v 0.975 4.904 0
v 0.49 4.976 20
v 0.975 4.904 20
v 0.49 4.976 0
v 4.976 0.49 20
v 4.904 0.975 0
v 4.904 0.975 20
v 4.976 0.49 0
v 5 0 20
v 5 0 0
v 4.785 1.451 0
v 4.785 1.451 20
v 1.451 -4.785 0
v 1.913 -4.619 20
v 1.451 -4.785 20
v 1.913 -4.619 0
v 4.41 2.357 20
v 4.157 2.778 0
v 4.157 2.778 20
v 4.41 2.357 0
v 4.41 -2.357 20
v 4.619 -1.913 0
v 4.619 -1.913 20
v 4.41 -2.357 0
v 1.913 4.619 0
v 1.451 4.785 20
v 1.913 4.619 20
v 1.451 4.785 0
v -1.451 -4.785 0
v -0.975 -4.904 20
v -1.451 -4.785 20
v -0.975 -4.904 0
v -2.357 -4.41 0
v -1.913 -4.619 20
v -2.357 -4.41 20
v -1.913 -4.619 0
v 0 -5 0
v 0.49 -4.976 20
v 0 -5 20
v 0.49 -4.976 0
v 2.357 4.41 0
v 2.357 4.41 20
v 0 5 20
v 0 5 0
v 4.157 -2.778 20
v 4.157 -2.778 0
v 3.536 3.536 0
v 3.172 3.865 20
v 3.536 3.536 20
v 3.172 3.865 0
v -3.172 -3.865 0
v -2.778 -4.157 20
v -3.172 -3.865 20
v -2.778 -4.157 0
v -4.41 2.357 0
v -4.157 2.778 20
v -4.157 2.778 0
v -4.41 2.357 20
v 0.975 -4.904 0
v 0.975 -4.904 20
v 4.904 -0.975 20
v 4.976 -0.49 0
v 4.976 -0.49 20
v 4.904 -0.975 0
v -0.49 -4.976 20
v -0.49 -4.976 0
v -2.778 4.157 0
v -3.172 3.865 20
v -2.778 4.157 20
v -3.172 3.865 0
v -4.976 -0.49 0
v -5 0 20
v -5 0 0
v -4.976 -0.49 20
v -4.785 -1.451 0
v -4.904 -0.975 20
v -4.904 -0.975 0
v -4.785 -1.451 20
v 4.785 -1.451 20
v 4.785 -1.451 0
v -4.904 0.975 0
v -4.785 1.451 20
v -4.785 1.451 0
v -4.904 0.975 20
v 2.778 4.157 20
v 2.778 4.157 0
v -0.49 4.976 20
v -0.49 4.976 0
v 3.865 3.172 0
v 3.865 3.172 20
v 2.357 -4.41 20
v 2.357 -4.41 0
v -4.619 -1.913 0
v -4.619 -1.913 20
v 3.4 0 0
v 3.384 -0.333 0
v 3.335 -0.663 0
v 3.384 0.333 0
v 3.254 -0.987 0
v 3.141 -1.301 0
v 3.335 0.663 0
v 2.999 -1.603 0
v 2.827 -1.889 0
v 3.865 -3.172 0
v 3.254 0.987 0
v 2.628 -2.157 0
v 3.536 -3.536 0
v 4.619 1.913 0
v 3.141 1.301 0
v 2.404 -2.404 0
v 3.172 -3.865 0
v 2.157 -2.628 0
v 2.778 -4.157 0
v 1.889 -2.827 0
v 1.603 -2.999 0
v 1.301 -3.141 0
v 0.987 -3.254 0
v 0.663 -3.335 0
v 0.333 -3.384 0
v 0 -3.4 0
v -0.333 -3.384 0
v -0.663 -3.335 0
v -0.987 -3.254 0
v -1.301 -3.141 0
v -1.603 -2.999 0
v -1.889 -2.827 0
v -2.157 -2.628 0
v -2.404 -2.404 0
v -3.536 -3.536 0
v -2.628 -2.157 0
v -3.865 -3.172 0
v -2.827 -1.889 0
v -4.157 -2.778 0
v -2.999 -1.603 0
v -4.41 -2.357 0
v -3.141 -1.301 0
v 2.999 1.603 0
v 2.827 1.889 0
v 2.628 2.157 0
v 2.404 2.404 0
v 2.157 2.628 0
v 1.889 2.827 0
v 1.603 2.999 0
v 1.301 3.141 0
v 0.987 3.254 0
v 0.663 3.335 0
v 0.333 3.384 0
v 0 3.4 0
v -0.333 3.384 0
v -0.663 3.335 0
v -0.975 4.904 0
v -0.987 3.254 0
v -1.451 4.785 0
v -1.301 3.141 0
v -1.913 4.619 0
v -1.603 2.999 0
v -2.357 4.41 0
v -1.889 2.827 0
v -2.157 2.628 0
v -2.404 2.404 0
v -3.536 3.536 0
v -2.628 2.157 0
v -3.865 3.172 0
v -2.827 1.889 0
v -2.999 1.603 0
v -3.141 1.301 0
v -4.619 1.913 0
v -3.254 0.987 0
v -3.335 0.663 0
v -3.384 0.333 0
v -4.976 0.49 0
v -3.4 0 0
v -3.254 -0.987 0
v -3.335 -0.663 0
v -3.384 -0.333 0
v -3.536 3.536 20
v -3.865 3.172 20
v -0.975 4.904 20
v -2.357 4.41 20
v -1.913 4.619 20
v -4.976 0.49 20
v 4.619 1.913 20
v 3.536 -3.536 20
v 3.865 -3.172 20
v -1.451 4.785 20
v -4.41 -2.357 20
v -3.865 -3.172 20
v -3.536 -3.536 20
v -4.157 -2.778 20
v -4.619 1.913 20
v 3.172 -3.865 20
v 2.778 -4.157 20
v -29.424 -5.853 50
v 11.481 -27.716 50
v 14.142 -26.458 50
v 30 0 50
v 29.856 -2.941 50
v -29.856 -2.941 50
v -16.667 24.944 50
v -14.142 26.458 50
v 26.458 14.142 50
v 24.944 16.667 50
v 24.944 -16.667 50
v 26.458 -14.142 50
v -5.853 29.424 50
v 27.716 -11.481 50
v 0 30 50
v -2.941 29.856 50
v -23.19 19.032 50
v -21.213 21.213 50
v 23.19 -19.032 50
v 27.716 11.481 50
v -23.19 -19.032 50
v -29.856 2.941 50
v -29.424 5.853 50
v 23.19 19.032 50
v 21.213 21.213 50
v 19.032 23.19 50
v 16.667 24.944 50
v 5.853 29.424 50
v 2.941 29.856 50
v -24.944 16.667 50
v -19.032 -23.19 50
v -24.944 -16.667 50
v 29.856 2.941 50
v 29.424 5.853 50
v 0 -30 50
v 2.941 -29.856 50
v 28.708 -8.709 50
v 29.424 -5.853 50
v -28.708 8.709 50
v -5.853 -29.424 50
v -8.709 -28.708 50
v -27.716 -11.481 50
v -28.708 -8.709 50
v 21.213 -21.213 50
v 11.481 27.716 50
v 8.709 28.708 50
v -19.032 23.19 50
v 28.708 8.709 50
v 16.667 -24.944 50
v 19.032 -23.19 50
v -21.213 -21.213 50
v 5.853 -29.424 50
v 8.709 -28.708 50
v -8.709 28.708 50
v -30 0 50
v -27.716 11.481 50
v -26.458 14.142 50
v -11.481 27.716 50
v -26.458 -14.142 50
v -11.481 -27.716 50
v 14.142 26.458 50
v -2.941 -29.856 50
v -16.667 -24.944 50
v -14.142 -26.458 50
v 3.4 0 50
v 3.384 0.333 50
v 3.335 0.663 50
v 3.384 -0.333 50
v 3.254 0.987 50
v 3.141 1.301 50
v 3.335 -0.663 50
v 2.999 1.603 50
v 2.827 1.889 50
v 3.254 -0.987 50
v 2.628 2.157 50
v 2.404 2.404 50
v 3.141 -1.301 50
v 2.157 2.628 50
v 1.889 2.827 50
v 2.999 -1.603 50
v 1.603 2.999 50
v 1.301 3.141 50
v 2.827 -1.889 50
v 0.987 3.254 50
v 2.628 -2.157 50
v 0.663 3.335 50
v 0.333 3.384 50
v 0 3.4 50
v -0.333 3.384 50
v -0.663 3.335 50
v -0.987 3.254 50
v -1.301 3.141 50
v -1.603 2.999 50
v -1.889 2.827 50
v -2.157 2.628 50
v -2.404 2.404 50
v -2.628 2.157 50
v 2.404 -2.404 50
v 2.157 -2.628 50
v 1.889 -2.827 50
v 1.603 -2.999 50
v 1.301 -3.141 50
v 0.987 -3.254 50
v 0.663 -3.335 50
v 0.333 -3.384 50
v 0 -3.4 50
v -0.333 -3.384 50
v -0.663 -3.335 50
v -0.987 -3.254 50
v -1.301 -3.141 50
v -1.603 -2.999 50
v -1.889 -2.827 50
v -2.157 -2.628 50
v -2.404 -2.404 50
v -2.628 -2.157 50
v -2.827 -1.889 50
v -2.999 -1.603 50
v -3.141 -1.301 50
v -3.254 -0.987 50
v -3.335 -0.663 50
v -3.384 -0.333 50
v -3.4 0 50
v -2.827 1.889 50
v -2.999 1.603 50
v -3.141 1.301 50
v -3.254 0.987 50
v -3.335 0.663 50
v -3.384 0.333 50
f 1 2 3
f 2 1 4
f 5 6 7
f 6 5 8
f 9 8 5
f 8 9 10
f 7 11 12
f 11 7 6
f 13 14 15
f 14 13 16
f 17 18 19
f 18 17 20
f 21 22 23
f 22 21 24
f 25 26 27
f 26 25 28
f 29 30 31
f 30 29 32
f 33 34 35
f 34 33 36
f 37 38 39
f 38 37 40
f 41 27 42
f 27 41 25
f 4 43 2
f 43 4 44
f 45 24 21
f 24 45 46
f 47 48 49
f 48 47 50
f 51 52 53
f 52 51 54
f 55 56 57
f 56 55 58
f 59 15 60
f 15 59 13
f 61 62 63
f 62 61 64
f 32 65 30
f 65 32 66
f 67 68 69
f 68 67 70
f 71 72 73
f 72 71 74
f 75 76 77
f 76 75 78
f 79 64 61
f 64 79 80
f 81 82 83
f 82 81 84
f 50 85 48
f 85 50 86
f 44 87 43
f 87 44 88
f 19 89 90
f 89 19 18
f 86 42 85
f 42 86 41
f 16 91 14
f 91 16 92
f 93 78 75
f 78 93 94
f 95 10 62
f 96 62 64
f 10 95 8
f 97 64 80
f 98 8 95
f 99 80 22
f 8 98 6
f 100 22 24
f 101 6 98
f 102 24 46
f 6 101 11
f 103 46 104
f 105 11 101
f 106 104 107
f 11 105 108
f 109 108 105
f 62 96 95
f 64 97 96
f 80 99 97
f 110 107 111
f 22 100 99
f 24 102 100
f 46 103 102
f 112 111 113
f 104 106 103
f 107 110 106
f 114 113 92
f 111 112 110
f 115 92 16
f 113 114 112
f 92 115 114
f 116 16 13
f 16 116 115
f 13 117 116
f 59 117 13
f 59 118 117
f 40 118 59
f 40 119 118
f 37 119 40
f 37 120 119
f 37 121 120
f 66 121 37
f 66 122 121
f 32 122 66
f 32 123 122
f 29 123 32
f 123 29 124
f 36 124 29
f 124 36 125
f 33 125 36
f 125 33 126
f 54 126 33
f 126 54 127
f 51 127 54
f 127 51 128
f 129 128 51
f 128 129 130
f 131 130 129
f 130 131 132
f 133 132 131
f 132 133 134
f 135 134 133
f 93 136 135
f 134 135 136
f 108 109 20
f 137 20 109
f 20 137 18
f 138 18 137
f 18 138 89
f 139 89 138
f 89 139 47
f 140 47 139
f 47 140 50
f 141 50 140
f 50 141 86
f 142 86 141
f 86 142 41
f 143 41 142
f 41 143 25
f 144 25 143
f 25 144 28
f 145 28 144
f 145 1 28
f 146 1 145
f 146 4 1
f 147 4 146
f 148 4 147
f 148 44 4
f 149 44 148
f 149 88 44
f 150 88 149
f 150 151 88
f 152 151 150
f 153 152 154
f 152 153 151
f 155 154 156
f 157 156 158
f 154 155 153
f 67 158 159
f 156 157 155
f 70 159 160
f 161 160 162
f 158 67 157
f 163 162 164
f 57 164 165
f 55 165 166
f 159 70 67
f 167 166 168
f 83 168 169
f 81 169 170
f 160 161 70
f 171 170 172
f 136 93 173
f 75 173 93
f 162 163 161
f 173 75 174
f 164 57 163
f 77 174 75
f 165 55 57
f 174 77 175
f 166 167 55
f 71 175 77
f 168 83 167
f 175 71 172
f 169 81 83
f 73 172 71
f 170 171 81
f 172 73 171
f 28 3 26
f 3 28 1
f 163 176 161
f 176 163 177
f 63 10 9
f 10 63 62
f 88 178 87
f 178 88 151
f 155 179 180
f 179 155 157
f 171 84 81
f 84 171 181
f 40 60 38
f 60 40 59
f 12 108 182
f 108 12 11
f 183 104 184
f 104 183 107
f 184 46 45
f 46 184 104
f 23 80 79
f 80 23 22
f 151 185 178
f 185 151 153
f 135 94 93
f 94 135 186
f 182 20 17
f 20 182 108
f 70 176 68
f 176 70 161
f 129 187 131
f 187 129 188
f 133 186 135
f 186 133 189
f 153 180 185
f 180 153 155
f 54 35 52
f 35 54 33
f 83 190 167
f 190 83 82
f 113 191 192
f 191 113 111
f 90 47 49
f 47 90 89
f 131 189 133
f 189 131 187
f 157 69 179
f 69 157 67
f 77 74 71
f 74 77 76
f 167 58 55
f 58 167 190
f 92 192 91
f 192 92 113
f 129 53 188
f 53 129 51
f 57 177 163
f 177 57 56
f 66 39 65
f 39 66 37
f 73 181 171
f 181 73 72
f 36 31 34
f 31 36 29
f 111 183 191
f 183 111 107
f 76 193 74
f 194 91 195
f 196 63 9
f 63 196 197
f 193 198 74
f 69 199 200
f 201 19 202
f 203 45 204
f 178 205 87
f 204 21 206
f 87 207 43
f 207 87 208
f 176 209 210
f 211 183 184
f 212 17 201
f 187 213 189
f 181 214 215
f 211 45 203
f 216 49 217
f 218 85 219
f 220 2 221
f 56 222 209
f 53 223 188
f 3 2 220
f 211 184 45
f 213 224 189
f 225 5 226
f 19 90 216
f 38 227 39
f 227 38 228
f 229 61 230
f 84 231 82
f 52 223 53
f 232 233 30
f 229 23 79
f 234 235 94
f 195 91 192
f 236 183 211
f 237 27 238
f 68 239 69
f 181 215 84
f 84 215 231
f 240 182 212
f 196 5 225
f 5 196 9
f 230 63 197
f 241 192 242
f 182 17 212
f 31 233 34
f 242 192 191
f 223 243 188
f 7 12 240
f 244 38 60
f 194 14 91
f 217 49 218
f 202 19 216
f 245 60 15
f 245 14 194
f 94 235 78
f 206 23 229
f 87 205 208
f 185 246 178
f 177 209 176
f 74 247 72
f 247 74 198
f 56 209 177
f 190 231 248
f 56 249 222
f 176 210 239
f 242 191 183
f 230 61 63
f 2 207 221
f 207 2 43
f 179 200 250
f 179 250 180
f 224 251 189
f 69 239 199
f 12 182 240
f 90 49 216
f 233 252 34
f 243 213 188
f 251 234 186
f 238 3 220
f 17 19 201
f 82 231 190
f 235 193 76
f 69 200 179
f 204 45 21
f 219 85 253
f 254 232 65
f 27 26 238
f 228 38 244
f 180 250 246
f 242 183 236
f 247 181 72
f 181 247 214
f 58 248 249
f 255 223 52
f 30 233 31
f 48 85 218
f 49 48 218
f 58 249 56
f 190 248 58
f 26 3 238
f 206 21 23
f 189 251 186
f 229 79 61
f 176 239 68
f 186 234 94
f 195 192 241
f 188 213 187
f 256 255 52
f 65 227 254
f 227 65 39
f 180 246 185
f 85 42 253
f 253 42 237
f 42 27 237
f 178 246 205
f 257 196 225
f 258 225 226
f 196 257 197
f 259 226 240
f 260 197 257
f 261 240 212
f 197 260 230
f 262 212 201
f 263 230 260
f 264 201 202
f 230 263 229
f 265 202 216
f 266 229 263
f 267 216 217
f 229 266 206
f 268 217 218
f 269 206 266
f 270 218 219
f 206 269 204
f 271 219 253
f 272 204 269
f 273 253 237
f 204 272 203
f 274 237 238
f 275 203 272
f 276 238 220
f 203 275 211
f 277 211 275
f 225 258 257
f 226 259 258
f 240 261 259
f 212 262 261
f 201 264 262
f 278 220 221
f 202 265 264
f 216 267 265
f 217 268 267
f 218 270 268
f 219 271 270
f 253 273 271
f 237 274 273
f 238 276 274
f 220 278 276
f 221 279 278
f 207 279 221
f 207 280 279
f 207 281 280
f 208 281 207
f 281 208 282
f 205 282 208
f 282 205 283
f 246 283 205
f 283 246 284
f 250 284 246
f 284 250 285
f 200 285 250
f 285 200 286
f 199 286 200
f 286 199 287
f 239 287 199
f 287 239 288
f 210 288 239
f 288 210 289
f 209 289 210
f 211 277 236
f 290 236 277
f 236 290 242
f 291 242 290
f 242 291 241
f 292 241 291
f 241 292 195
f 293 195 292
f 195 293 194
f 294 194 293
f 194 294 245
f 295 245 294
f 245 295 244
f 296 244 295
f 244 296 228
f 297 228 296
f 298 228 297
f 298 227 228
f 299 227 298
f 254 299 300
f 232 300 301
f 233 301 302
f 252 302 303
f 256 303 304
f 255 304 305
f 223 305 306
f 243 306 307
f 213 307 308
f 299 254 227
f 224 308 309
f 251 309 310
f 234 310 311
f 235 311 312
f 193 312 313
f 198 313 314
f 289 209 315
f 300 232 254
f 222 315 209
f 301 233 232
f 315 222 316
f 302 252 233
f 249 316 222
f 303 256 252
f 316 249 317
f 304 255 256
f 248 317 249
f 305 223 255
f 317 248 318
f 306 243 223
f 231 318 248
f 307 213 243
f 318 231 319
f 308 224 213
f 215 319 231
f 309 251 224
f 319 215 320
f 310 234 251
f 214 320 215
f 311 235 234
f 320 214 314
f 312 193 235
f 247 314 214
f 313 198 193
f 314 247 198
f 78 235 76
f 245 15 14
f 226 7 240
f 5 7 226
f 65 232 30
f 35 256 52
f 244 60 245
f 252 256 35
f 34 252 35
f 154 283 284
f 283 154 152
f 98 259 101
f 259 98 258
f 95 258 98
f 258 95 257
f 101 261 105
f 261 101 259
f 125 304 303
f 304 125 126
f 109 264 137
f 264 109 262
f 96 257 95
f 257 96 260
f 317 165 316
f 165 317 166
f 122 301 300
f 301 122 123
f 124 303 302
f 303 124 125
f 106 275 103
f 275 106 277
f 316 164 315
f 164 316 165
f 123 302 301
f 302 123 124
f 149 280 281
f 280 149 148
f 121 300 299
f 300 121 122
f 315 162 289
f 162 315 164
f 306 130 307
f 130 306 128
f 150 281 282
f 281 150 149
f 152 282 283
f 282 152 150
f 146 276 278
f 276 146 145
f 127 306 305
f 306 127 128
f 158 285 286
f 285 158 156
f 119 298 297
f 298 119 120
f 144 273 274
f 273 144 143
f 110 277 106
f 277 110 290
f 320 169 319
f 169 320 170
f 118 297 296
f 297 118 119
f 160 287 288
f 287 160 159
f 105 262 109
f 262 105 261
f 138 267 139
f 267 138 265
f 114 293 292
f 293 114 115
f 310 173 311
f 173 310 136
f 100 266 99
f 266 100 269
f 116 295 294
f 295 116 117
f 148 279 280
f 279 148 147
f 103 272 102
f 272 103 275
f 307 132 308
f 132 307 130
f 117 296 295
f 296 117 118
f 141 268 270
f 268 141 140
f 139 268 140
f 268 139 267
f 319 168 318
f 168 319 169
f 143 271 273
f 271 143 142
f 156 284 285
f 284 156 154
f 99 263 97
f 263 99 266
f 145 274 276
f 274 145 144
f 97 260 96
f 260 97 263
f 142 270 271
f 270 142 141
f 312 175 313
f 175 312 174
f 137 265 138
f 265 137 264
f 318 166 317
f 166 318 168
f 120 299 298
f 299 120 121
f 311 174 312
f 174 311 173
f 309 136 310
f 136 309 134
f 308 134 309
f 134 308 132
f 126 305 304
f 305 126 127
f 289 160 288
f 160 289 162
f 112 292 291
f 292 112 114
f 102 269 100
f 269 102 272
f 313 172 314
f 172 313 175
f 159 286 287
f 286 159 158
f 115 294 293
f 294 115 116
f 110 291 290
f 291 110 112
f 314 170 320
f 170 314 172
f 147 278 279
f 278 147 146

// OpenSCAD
// Lab funnel - printed upright, wide opening at the top
// Units: mm. Wall thickness 1.6 mm throughout.

$fn = 64;

// ---- Parameters ----
spout_od      = 10;    // outer diameter of spout
spout_id      = spout_od - 2 * 1.6;  // spout bore (6.8 mm)
spout_h       = 20;    // spout height (z = 0 .. 20)

cone_bottom_d = spout_id;  // cone inner diameter at z = 20
cone_top_d    = 60;    // cone rim outer diameter at z = 50
cone_h        = 50 - 20; // cone height (z = 20 .. 50)

eps           = 0.5;   // overlap for clean cuts

// ---- Model ----
difference() {
    union() {
        // Spout
        cylinder(h = spout_h, d = spout_od);

        // Cone: outer surface from spout diameter up to rim
        translate([0, 0, spout_h])
            cylinder(h = cone_h, d1 = spout_od, d2 = cone_top_d);
    }

    // Central bore through the full height
    translate([0, 0, -eps])
        cylinder(h = spout_h + cone_h + 2 * eps, d = spout_id);
}
